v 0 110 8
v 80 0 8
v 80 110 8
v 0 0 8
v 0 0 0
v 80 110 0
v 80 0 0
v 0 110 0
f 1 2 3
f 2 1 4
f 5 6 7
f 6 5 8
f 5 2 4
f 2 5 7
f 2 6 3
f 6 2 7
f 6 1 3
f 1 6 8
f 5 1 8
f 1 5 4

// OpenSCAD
// Concept only. Provisional dimensions in mm.
$fn=32;
cube([80,110,8]);
